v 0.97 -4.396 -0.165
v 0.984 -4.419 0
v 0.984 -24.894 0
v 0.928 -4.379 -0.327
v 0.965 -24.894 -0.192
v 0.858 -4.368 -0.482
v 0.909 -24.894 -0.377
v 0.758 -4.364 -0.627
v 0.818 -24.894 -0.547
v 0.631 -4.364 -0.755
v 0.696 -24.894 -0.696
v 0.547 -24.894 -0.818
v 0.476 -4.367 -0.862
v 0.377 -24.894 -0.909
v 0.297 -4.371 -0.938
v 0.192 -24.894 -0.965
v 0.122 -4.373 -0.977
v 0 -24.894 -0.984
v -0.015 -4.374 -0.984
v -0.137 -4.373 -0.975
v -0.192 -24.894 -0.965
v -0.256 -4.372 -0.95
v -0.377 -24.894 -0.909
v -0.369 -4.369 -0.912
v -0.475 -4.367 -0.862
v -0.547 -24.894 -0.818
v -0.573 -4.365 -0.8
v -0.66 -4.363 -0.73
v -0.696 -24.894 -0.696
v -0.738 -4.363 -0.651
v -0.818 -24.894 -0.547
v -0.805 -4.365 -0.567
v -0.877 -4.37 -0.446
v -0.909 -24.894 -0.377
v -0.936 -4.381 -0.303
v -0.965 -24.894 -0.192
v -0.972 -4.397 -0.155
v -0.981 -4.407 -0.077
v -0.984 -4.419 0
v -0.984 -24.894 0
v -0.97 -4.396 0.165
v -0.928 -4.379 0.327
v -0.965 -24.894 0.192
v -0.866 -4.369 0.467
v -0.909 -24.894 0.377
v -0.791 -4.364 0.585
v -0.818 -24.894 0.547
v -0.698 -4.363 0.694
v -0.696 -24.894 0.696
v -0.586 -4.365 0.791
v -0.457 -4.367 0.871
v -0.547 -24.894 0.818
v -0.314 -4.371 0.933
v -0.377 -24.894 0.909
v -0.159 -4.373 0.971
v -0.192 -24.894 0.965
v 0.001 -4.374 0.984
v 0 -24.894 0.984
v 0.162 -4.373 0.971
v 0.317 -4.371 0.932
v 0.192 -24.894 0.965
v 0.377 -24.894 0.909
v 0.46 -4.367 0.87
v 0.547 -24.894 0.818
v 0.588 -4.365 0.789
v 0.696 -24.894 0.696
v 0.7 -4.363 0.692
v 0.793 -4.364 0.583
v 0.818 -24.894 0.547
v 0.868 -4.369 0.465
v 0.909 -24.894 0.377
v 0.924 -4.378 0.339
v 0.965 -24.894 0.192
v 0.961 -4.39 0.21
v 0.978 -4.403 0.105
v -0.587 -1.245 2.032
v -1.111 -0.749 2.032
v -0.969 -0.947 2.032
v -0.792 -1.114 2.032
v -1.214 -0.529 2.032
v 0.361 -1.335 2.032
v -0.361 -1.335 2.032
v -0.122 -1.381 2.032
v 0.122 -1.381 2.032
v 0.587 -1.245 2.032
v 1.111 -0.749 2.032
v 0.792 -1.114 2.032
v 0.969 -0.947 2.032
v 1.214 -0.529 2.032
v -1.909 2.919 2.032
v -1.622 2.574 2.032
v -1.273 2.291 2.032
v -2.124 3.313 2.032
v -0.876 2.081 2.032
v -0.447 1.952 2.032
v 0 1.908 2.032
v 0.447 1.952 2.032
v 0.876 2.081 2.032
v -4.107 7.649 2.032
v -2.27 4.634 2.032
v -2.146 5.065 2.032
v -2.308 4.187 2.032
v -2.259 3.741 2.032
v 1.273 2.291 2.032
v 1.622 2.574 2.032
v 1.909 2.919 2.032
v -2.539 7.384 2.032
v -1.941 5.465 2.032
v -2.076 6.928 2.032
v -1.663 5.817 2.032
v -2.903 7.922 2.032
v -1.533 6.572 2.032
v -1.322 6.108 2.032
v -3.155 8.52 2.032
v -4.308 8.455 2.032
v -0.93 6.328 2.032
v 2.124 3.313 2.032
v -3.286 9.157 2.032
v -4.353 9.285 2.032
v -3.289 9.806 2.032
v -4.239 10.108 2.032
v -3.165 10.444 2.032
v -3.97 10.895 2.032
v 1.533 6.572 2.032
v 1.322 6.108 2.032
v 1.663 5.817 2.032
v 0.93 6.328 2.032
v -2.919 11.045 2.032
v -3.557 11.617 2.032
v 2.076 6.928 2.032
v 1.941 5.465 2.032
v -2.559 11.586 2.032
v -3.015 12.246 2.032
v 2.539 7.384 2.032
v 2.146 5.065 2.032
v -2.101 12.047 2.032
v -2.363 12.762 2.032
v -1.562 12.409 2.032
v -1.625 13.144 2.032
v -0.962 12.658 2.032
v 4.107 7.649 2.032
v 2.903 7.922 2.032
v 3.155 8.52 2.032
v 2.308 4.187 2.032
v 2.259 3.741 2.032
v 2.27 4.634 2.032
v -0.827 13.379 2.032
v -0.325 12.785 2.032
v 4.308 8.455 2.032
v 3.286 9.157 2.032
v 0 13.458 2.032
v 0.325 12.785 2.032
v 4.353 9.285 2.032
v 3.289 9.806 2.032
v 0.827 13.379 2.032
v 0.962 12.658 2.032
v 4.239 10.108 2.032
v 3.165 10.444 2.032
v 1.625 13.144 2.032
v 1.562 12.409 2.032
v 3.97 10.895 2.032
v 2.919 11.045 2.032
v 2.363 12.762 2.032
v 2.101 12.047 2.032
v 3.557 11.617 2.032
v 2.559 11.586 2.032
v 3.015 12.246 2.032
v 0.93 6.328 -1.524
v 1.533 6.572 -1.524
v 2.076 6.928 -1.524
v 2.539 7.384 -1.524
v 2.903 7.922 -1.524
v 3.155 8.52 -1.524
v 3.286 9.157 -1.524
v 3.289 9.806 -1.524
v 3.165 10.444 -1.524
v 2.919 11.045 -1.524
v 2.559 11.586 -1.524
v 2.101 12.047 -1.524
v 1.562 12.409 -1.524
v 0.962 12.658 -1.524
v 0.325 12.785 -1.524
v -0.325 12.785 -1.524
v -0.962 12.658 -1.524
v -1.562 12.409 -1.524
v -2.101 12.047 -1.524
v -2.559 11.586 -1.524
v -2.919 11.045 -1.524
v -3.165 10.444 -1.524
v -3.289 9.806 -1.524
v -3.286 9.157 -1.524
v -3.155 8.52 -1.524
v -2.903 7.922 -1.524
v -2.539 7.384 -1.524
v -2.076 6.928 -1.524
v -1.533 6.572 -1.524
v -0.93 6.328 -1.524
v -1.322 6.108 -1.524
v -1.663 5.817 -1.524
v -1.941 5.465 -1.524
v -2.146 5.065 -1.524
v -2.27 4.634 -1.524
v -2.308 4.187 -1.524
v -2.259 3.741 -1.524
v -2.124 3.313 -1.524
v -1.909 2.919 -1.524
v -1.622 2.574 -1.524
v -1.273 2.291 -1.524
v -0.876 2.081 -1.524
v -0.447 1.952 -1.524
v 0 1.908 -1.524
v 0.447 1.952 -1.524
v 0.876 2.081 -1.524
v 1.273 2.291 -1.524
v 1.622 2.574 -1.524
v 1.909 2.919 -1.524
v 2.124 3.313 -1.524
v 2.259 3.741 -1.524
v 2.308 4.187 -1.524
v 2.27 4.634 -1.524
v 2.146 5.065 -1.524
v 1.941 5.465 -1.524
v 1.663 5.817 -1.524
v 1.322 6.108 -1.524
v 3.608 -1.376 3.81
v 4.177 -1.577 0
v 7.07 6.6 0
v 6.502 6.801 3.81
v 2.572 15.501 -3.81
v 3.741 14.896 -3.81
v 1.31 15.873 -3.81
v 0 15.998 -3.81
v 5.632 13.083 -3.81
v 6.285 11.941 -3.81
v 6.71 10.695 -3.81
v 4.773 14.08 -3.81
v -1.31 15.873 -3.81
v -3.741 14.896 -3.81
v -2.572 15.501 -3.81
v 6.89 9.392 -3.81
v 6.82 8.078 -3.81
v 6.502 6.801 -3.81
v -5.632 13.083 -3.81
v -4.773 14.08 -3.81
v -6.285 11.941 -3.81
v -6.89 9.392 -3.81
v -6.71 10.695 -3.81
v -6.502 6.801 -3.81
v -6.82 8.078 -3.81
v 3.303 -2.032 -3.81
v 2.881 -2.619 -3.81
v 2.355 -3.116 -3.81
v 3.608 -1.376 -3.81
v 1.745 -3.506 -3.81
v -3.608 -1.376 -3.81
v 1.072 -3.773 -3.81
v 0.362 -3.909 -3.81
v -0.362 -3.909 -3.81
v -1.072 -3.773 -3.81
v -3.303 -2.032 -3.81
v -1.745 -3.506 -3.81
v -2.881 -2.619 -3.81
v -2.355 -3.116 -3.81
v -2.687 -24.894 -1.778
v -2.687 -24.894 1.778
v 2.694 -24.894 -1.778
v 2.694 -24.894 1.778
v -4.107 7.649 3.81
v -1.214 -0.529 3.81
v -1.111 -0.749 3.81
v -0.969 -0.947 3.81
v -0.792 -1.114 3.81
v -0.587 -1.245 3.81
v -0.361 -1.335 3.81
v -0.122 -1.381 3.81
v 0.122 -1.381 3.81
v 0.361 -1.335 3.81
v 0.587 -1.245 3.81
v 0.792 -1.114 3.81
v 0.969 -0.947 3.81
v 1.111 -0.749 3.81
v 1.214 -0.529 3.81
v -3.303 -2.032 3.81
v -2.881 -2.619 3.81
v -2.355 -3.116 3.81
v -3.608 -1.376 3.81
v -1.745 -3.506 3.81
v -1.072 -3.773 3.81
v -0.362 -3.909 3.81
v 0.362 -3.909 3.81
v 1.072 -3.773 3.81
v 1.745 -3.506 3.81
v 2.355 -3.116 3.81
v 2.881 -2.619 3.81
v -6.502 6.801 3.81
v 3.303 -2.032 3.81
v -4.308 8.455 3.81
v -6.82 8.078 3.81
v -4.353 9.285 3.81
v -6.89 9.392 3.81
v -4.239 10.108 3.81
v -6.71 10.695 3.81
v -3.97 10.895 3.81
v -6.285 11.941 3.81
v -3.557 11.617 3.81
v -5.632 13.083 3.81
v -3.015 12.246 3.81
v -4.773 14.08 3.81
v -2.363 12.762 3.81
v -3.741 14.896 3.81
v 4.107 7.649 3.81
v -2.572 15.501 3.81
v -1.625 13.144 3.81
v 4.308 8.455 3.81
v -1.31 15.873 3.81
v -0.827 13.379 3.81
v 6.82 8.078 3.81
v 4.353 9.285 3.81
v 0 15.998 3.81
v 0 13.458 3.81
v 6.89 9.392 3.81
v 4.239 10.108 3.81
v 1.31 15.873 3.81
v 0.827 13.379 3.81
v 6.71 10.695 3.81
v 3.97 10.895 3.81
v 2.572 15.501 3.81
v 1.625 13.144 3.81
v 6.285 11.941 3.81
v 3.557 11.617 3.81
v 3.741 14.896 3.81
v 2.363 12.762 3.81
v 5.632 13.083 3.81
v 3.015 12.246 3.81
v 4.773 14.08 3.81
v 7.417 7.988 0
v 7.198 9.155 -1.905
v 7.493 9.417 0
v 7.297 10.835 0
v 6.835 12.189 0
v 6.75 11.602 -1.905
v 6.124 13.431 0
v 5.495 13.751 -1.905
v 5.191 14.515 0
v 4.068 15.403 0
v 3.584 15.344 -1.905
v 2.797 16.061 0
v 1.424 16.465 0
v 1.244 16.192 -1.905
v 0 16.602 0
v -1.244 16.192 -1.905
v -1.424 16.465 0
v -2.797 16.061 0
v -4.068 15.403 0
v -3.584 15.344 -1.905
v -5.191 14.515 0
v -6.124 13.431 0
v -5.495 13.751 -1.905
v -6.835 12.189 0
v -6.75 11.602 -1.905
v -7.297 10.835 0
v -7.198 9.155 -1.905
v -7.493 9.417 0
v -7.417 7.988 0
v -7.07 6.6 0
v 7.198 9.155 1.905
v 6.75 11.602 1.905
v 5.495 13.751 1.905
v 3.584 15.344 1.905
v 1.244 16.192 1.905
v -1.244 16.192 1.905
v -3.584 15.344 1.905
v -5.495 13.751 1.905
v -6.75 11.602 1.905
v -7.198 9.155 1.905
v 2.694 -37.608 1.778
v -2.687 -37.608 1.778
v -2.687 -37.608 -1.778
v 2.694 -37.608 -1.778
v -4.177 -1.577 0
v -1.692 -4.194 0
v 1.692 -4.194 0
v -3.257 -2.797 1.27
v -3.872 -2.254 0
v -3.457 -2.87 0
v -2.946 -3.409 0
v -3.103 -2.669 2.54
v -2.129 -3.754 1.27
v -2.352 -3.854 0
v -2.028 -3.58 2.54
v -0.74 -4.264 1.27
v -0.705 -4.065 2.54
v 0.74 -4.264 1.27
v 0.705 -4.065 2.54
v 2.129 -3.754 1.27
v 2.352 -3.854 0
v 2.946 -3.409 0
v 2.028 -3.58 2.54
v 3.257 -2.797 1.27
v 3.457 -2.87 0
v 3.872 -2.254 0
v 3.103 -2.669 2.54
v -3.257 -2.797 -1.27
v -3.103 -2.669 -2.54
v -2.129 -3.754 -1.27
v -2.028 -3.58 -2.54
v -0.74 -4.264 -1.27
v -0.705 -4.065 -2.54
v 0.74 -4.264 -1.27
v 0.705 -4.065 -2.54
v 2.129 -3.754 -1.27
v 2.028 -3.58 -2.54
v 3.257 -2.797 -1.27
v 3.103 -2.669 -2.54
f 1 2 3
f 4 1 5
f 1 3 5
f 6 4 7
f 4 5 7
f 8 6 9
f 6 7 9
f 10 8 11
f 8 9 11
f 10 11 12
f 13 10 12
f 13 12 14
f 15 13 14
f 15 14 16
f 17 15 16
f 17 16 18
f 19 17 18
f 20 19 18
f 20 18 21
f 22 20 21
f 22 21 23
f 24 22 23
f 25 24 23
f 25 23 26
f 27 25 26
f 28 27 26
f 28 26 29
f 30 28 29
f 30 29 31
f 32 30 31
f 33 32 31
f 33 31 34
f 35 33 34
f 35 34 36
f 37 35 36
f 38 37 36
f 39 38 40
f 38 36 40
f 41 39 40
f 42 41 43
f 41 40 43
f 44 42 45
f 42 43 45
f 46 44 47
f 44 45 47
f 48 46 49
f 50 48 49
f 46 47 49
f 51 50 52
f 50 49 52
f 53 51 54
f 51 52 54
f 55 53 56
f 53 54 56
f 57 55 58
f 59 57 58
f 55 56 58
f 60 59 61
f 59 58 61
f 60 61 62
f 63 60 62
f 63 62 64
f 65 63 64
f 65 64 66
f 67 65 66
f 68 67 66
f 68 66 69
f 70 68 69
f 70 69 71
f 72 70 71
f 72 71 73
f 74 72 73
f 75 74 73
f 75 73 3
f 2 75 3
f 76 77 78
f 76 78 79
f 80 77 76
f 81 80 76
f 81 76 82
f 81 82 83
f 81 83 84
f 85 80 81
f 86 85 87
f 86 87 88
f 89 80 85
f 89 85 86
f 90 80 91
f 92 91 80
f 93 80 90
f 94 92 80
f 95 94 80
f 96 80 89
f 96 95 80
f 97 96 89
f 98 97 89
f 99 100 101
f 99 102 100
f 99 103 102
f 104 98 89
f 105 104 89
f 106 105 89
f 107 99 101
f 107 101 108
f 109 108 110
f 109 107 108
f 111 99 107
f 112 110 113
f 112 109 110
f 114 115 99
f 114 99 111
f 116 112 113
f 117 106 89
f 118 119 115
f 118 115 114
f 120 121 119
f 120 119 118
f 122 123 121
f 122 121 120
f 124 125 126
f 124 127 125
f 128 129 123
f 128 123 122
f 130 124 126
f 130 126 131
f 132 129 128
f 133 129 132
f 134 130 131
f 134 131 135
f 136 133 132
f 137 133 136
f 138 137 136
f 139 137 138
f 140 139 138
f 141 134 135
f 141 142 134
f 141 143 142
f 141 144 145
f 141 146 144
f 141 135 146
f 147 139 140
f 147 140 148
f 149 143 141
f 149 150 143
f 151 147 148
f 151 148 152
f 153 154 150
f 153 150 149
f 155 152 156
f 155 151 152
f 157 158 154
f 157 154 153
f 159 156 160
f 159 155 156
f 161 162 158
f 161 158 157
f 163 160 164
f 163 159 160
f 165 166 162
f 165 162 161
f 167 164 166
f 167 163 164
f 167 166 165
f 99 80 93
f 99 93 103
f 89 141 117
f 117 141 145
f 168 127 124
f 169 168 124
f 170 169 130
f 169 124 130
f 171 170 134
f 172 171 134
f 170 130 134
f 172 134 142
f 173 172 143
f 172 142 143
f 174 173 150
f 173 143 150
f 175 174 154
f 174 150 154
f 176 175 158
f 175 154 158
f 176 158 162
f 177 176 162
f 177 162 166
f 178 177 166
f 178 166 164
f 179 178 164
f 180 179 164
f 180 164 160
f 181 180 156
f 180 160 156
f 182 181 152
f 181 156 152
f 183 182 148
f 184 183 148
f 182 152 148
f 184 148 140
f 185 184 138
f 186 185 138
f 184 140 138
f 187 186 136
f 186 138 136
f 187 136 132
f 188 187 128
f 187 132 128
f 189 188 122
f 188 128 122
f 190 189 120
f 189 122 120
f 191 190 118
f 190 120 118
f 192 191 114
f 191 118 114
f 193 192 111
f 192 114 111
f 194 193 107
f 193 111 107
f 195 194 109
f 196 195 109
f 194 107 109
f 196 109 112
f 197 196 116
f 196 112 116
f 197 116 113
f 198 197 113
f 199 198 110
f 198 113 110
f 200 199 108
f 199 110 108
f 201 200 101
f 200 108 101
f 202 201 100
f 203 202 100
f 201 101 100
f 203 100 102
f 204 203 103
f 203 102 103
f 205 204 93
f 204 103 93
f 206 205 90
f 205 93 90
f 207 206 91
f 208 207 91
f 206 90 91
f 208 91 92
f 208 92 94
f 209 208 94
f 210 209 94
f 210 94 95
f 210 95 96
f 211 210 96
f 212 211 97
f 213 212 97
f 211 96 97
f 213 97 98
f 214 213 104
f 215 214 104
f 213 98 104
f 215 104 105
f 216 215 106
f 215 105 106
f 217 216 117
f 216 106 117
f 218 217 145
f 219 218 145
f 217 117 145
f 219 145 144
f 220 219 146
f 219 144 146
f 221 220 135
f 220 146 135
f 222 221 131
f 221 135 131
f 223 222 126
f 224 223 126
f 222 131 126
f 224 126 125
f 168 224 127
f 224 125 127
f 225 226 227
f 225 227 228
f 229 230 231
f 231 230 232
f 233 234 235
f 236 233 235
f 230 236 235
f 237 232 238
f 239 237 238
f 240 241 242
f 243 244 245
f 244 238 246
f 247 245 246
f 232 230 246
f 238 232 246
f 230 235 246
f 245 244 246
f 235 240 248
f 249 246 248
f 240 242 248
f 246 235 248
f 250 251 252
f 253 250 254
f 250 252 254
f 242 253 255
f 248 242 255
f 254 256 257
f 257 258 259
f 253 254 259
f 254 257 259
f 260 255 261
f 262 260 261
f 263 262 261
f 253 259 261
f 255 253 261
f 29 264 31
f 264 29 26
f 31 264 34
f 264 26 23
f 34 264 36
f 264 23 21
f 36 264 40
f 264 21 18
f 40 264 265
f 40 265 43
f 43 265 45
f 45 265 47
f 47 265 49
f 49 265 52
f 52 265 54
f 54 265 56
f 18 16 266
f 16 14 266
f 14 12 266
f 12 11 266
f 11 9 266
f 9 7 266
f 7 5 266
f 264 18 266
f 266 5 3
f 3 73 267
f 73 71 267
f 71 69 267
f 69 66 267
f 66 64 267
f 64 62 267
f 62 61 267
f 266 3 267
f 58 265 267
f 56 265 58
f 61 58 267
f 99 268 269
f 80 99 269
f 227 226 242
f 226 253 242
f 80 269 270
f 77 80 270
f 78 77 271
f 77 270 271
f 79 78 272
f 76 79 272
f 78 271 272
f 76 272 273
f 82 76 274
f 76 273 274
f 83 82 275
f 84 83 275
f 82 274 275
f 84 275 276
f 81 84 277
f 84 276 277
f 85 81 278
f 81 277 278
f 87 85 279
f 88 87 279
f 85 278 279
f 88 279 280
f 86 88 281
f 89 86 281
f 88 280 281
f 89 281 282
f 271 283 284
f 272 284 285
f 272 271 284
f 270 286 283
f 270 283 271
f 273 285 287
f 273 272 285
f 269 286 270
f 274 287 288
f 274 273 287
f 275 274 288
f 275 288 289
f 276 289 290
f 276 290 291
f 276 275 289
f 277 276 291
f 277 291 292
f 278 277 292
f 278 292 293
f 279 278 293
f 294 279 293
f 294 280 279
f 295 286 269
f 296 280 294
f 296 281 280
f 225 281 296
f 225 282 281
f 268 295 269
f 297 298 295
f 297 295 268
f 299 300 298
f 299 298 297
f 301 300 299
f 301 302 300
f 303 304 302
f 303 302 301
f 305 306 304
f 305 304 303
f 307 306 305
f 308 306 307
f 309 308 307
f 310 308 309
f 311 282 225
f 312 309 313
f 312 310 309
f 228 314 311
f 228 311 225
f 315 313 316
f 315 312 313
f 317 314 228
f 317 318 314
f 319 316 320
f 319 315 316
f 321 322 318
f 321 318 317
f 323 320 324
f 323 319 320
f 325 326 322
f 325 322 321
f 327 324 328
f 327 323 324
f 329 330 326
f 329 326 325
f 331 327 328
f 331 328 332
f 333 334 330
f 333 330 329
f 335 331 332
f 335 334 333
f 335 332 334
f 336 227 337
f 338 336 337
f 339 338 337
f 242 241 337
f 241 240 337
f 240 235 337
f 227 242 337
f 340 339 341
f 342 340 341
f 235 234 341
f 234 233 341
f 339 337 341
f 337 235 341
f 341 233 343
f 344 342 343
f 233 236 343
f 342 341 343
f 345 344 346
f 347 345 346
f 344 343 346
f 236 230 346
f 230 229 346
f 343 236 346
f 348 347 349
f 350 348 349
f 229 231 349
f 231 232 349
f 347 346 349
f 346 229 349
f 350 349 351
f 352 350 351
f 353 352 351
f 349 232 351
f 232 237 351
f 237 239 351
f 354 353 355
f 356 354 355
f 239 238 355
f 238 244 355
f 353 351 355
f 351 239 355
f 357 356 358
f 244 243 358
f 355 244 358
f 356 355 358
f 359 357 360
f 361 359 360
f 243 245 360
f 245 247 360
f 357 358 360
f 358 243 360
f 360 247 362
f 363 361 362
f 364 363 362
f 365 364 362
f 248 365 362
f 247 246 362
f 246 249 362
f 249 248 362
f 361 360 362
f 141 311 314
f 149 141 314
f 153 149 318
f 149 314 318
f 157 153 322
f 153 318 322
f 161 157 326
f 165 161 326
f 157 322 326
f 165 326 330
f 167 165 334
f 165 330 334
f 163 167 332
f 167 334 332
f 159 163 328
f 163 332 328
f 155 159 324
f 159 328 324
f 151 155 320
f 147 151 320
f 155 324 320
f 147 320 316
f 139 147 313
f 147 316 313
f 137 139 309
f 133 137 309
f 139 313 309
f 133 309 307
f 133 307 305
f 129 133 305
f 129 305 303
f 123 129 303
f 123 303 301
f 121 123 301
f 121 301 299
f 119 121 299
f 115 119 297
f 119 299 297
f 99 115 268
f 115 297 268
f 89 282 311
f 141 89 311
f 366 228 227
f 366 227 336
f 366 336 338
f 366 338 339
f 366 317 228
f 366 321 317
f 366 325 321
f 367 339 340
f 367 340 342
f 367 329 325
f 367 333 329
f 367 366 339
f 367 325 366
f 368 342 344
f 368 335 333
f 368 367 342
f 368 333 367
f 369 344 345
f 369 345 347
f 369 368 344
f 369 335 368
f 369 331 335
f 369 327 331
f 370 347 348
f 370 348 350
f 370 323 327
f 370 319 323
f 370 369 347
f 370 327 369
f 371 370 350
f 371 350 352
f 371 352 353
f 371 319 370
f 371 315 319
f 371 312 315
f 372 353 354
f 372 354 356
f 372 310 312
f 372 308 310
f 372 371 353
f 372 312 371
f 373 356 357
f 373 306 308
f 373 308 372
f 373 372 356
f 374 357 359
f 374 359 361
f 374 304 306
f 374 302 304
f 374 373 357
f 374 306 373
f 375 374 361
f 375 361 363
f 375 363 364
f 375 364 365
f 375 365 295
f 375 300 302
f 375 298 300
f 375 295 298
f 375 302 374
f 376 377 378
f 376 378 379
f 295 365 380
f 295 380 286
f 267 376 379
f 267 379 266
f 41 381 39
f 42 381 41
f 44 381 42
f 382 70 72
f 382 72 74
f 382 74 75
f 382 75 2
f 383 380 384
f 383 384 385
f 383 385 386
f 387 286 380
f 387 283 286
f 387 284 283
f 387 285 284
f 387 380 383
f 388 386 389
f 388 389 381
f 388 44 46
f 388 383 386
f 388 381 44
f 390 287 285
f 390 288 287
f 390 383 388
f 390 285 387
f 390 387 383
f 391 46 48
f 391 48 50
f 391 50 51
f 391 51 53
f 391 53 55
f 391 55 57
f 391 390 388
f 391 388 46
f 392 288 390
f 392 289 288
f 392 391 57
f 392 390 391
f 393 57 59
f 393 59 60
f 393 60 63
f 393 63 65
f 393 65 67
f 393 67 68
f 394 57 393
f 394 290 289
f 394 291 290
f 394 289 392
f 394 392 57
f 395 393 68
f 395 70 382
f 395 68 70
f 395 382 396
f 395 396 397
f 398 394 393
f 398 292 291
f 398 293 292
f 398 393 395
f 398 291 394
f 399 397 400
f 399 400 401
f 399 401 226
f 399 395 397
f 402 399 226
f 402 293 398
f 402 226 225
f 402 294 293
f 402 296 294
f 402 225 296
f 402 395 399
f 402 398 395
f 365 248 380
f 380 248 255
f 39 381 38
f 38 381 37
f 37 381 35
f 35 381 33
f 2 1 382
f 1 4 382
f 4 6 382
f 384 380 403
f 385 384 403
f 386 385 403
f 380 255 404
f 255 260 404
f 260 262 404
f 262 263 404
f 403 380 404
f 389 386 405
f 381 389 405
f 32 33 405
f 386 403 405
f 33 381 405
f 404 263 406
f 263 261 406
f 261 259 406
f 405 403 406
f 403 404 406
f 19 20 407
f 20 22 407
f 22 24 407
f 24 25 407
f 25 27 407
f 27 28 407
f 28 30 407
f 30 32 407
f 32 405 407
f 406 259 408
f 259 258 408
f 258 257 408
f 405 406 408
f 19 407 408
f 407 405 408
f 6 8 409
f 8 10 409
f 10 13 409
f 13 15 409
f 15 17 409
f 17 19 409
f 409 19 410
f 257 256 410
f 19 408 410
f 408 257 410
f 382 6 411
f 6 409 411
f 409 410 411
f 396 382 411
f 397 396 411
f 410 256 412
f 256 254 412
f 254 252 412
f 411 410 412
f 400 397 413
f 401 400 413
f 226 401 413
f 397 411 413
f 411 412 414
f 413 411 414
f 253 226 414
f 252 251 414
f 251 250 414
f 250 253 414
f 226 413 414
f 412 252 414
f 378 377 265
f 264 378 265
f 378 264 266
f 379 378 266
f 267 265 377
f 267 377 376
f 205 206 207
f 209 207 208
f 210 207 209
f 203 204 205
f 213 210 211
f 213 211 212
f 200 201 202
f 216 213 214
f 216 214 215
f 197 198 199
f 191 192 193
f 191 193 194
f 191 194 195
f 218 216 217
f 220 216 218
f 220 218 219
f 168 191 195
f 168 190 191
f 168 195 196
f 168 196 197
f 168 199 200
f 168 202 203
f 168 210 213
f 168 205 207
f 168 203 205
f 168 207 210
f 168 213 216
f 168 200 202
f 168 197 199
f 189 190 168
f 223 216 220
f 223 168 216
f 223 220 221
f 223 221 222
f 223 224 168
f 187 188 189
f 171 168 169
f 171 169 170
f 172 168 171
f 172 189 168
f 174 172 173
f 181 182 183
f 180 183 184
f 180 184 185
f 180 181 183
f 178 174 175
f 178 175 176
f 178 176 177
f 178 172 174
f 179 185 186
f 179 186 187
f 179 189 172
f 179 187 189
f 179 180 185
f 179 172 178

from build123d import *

# Parameters (mm, degrees)
BOSS_EXTRUDE3_DEPTH           = 3.81
BOSS_EXTRUDE3_TAPER           = 9
BOSS_EXTRUDE3_OTHER_WAY_DEPTH = 3.81
BOSS_EXTRUDE3_OTHER_WAY_TAPER = 9
CUT_EXTRUDE1_DEPTH            = 1.778
CUT_EXTRUDE2_DEPTH            = 3.556
BOSS_EXTRUDE4_REACH           = 43.527
SKETCH6_R                     = 0.984091707
SKETCH7_W                     = 5.381079671
SKETCH7_H                     = 12.713539883
BOSS_EXTRUDE5_DEPTH           = 1.778


with BuildPart() as part:
    # Sketch1 → Boss-Extrude3 (new body)
    with BuildSketch(Plane.XY):
        with BuildLine():
            Line((-7.070417047, 6.599948555), (-4.176993685, -1.577117469))
            ThreePointArc((-4.176993685, -1.577117469), (0, -4.529882932), (4.176993685, -1.577117469))
            Line((4.176993685, -1.577117469), (7.070417047, 6.599948555))
            ThreePointArc((7.070417047, 6.599948555), (0, 16.601788433), (-7.070417047, 6.599948555))
        make_face()
    extrude(amount=BOSS_EXTRUDE3_DEPTH, taper=BOSS_EXTRUDE3_TAPER)

    # Sketch1 → Boss-Extrude3 other way (add)
    with BuildSketch(Plane.XY):
        with BuildLine():
            Line((-7.070417047, 6.599948555), (-4.176993685, -1.577117469))
            ThreePointArc((-4.176993685, -1.577117469), (0, -4.529882932), (4.176993685, -1.577117469))
            Line((4.176993685, -1.577117469), (7.070417047, 6.599948555))
            ThreePointArc((7.070417047, 6.599948555), (0, 16.601788433), (-7.070417047, 6.599948555))
        make_face()
    extrude(amount=-BOSS_EXTRUDE3_OTHER_WAY_DEPTH, taper=BOSS_EXTRUDE3_OTHER_WAY_TAPER)

    # Sketch3 → Cut-Extrude1 (cut)
    with BuildSketch(Plane.XY.offset(3.81)):
        with BuildLine():
            Line((-4.107021698, 7.648534601), (-1.213598336, -0.528531422))
            ThreePointArc((-1.213598336, -0.528531422), (0, -1.386438214), (1.213598336, -0.528531422))
            Line((1.213598336, -0.528531422), (4.107021698, 7.648534601))
            ThreePointArc((4.107021698, 7.648534601), (0, 13.458343715), (-4.107021698, 7.648534601))
        make_face()
    extrude(amount=-CUT_EXTRUDE1_DEPTH, mode=Mode.SUBTRACT)

    # Sketch4 → Cut-Extrude2 (cut)
    with BuildSketch(Plane.XY.offset(2.032)):
        with BuildLine():
            ThreePointArc((0.9304508, 6.328323332), (0, 12.801349411), (-0.9304508, 6.328323332))
            ThreePointArc((-0.9304508, 6.328323332), (0, 1.908170612), (0.9304508, 6.328323332))
        make_face()
    extrude(amount=-CUT_EXTRUDE2_DEPTH, mode=Mode.SUBTRACT)

    # Sketch6 → Boss-Extrude4 (add, up to next)
    with BuildSketch(Plane(origin=(0, -24.925590476, 0), x_dir=(1, 0, 0), z_dir=(0, 1, 0)), mode=Mode.PRIVATE) as boss_extrude4_sk1:
        Circle(SKETCH6_R)
    boss_extrude4_tool1 = extrude(boss_extrude4_sk1.sketch, amount=BOSS_EXTRUDE4_REACH, mode=Mode.PRIVATE) - part.part
    add(boss_extrude4_tool1.solids().sort_by_distance((0, -24.92559, 0))[0])

    # Sketch7 → Boss-Extrude5 (add, symmetric)
    with BuildSketch(Plane.XY):
        with Locations((0.003481044, -31.250797668)):
            Rectangle(SKETCH7_W, SKETCH7_H)
    extrude(amount=BOSS_EXTRUDE5_DEPTH, both=True)


solid = part.part
